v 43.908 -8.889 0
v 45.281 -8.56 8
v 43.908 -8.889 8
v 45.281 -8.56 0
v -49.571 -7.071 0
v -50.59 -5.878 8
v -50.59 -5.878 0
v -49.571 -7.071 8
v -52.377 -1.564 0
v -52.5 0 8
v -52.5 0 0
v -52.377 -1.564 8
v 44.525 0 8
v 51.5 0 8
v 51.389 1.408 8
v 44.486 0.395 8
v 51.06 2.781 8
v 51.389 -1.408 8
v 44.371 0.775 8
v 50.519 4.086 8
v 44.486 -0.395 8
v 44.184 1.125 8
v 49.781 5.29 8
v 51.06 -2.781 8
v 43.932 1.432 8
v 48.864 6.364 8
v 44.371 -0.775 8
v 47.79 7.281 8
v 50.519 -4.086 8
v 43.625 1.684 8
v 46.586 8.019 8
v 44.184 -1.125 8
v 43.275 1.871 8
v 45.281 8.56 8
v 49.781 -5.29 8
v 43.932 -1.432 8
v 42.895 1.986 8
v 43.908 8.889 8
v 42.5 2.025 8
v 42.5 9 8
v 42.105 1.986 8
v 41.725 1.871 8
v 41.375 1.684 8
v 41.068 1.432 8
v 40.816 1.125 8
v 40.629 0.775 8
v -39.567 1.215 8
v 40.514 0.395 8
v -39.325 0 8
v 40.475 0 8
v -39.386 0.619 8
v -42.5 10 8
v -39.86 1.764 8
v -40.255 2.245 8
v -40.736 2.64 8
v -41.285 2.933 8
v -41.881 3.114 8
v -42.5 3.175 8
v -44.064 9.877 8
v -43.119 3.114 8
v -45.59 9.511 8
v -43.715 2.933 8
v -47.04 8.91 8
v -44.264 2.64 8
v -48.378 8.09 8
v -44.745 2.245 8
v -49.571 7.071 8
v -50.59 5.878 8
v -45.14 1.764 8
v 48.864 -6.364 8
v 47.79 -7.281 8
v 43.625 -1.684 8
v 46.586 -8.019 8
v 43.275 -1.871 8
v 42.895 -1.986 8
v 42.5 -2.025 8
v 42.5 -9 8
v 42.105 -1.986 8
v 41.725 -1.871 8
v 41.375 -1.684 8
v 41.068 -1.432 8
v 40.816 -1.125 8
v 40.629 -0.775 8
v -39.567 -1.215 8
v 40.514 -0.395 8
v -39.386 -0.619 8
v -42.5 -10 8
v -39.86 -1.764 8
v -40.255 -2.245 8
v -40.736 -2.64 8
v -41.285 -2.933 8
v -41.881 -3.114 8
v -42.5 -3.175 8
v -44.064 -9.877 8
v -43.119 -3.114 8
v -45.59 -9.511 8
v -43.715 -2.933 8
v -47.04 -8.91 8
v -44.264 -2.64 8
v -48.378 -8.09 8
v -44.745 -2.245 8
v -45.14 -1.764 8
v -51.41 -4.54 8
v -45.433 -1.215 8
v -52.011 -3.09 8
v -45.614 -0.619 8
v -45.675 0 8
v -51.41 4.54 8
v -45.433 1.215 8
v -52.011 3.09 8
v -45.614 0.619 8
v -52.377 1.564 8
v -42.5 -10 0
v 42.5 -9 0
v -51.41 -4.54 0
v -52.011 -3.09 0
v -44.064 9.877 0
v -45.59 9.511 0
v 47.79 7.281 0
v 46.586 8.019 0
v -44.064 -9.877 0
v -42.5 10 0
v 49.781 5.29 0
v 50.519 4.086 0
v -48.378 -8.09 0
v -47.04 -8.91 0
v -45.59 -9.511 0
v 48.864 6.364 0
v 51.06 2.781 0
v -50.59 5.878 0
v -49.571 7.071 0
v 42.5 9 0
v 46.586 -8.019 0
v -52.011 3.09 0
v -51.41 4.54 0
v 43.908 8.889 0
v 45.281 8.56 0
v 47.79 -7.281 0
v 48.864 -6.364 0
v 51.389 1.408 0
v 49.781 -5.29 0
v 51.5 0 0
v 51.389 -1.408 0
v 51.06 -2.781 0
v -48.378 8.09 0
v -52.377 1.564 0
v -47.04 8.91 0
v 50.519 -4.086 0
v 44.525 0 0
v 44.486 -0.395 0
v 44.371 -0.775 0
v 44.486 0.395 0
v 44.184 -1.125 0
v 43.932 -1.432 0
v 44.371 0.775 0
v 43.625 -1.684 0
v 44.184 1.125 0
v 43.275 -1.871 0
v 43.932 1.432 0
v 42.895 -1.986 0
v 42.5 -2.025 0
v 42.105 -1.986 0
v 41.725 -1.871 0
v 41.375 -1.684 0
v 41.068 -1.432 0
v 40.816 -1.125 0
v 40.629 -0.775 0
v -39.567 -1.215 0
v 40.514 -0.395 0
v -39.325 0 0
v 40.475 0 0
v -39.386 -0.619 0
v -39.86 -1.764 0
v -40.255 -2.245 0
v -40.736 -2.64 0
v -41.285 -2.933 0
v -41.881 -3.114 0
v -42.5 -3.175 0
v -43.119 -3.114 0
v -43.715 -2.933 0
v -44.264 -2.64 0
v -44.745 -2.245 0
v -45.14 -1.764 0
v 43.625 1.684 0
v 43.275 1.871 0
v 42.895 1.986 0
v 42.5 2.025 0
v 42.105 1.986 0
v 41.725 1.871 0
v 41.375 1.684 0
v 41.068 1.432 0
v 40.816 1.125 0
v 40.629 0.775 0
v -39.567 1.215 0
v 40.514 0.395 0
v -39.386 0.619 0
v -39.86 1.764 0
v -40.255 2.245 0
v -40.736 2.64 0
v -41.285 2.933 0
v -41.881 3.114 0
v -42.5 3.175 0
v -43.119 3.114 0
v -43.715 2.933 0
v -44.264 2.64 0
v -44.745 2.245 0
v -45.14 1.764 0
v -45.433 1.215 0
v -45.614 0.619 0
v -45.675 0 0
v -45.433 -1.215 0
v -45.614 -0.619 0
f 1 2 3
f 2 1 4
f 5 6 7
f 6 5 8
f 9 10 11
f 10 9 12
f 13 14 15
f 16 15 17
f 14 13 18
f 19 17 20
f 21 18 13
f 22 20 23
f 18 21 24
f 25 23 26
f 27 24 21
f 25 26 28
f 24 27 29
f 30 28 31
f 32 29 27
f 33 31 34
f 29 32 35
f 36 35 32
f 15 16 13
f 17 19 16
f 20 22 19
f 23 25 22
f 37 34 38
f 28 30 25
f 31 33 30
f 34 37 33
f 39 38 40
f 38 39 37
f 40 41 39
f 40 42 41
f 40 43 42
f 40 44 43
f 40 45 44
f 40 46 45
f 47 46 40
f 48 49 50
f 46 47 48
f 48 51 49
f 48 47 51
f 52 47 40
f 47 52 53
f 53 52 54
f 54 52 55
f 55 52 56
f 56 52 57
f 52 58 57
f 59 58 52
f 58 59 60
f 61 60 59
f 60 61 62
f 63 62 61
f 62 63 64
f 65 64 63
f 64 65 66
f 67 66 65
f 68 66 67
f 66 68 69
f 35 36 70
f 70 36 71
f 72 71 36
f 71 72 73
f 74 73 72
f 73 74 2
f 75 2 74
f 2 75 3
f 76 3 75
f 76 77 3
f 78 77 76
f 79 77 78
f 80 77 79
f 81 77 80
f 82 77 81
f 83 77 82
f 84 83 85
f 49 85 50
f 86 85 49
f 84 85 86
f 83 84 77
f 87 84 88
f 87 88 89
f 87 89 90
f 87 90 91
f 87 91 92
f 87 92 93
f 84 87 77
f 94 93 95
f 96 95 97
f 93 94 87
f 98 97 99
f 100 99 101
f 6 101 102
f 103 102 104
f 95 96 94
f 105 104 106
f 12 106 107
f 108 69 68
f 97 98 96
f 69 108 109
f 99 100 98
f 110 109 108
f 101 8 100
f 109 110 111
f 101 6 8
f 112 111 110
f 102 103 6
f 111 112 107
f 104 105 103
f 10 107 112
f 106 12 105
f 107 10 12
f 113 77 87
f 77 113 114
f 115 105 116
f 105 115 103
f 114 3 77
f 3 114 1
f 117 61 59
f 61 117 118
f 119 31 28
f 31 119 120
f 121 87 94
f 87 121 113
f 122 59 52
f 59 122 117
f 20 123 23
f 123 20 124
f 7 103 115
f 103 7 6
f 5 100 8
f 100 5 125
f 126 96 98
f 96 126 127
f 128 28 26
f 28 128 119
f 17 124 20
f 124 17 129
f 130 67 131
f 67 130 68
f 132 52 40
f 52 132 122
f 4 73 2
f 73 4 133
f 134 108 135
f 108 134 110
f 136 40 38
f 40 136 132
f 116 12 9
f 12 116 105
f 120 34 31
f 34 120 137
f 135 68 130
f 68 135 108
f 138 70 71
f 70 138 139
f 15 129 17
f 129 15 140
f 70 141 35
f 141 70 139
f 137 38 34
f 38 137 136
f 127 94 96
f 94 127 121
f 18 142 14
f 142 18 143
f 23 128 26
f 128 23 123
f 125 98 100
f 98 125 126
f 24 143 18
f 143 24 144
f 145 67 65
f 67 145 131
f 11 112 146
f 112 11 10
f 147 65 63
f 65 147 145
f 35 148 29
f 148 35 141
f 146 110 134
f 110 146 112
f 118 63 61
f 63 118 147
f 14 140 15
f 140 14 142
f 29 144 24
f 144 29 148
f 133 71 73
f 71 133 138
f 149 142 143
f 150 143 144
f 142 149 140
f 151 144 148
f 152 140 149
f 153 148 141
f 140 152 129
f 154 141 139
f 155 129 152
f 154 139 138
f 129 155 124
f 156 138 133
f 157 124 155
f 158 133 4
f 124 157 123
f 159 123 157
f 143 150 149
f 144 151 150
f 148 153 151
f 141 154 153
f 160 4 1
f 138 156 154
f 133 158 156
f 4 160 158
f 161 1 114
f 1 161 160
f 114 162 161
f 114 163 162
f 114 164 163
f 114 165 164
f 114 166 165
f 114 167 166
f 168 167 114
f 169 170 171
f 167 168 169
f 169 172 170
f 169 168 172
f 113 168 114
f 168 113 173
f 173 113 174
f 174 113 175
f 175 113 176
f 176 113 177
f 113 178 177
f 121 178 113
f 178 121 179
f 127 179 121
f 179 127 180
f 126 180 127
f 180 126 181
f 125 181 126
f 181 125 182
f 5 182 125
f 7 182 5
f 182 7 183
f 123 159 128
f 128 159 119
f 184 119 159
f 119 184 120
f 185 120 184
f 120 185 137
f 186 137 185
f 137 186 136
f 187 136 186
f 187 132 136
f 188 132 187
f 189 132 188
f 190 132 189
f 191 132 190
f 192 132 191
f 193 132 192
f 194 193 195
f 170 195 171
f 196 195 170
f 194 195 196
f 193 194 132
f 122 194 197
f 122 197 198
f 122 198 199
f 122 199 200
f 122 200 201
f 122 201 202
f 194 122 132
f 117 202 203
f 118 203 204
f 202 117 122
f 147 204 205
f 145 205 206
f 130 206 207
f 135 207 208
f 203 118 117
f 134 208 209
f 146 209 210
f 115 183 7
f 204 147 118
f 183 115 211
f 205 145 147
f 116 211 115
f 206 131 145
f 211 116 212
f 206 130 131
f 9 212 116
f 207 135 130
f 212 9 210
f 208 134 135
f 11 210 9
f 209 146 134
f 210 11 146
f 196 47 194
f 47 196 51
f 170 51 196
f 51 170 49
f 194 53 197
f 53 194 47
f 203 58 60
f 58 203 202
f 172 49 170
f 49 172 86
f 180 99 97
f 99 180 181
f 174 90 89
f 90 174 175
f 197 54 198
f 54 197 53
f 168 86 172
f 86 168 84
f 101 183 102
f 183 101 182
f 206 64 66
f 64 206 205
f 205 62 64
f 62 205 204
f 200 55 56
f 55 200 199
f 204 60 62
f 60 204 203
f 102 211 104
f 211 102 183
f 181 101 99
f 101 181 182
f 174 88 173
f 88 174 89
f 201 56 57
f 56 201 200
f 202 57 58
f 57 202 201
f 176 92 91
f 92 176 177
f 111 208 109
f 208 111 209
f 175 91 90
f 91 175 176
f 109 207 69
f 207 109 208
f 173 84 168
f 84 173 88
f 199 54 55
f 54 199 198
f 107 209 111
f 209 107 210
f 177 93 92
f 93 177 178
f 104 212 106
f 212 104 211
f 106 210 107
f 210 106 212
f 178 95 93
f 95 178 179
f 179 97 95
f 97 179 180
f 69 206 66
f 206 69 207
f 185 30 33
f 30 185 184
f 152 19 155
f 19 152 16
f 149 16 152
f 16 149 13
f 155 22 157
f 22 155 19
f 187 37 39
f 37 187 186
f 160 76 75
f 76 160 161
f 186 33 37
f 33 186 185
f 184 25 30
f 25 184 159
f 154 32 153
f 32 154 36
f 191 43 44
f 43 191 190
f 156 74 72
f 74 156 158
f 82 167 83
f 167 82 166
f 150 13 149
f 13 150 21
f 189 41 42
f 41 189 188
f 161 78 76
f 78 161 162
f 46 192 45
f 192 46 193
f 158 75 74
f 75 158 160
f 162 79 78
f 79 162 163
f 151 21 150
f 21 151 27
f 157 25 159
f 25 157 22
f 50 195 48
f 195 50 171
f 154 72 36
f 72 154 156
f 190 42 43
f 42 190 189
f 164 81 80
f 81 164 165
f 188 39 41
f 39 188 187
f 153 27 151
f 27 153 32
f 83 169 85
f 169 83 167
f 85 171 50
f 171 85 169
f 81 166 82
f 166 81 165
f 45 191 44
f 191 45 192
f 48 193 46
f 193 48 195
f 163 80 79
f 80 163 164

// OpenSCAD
$fn = 32;

// ----------------------------------------------------------------------
// Lever: 85 mm between the bosses, 8 mm thick, smooth outline
// ----------------------------------------------------------------------

// --- parameters (mm) ---
lever_l = 85;             // distance between the boss centres
boss_a = 20;              // first boss diameter
boss_b = 18;              // second boss diameter
bore_a = 6.35;            // first bore
bore_b = 4.05;            // second bore
lever_t = 8;              // lever thickness

lever_profile = [[-52.5, 0], [-52.377, -1.564], [-52.011, -3.09], [-51.41, -4.54], [-50.59, -5.878], [-49.571, -7.071], [-48.378, -8.09], [-47.04, -8.91], [-45.59, -9.511], [-44.064, -9.877], [-42.5, -10], [42.5, -9], [43.908, -8.889], [45.281, -8.56], [46.586, -8.019], [47.79, -7.281], [48.864, -6.364], [49.781, -5.29], [50.519, -4.086], [51.06, -2.781], [51.389, -1.408], [51.5, 0], [51.389, 1.408], [51.06, 2.781], [50.519, 4.086], [49.781, 5.29], [48.864, 6.364], [47.79, 7.281], [46.586, 8.019], [45.281, 8.56], [43.908, 8.889], [42.5, 9], [-42.5, 10], [-44.064, 9.877], [-45.59, 9.511], [-47.04, 8.91], [-48.378, 8.09], [-49.571, 7.071], [-50.59, 5.878], [-51.41, 4.54], [-52.011, 3.09], [-52.377, 1.564]];

difference() {
  linear_extrude(height = lever_t) polygon(lever_profile);
  translate([-42.5, 0, -2.5]) cylinder(h = lever_t + 5, d = bore_a);
  translate([42.5, 0, -2.5]) cylinder(h = lever_t + 5, d = bore_b);
}
